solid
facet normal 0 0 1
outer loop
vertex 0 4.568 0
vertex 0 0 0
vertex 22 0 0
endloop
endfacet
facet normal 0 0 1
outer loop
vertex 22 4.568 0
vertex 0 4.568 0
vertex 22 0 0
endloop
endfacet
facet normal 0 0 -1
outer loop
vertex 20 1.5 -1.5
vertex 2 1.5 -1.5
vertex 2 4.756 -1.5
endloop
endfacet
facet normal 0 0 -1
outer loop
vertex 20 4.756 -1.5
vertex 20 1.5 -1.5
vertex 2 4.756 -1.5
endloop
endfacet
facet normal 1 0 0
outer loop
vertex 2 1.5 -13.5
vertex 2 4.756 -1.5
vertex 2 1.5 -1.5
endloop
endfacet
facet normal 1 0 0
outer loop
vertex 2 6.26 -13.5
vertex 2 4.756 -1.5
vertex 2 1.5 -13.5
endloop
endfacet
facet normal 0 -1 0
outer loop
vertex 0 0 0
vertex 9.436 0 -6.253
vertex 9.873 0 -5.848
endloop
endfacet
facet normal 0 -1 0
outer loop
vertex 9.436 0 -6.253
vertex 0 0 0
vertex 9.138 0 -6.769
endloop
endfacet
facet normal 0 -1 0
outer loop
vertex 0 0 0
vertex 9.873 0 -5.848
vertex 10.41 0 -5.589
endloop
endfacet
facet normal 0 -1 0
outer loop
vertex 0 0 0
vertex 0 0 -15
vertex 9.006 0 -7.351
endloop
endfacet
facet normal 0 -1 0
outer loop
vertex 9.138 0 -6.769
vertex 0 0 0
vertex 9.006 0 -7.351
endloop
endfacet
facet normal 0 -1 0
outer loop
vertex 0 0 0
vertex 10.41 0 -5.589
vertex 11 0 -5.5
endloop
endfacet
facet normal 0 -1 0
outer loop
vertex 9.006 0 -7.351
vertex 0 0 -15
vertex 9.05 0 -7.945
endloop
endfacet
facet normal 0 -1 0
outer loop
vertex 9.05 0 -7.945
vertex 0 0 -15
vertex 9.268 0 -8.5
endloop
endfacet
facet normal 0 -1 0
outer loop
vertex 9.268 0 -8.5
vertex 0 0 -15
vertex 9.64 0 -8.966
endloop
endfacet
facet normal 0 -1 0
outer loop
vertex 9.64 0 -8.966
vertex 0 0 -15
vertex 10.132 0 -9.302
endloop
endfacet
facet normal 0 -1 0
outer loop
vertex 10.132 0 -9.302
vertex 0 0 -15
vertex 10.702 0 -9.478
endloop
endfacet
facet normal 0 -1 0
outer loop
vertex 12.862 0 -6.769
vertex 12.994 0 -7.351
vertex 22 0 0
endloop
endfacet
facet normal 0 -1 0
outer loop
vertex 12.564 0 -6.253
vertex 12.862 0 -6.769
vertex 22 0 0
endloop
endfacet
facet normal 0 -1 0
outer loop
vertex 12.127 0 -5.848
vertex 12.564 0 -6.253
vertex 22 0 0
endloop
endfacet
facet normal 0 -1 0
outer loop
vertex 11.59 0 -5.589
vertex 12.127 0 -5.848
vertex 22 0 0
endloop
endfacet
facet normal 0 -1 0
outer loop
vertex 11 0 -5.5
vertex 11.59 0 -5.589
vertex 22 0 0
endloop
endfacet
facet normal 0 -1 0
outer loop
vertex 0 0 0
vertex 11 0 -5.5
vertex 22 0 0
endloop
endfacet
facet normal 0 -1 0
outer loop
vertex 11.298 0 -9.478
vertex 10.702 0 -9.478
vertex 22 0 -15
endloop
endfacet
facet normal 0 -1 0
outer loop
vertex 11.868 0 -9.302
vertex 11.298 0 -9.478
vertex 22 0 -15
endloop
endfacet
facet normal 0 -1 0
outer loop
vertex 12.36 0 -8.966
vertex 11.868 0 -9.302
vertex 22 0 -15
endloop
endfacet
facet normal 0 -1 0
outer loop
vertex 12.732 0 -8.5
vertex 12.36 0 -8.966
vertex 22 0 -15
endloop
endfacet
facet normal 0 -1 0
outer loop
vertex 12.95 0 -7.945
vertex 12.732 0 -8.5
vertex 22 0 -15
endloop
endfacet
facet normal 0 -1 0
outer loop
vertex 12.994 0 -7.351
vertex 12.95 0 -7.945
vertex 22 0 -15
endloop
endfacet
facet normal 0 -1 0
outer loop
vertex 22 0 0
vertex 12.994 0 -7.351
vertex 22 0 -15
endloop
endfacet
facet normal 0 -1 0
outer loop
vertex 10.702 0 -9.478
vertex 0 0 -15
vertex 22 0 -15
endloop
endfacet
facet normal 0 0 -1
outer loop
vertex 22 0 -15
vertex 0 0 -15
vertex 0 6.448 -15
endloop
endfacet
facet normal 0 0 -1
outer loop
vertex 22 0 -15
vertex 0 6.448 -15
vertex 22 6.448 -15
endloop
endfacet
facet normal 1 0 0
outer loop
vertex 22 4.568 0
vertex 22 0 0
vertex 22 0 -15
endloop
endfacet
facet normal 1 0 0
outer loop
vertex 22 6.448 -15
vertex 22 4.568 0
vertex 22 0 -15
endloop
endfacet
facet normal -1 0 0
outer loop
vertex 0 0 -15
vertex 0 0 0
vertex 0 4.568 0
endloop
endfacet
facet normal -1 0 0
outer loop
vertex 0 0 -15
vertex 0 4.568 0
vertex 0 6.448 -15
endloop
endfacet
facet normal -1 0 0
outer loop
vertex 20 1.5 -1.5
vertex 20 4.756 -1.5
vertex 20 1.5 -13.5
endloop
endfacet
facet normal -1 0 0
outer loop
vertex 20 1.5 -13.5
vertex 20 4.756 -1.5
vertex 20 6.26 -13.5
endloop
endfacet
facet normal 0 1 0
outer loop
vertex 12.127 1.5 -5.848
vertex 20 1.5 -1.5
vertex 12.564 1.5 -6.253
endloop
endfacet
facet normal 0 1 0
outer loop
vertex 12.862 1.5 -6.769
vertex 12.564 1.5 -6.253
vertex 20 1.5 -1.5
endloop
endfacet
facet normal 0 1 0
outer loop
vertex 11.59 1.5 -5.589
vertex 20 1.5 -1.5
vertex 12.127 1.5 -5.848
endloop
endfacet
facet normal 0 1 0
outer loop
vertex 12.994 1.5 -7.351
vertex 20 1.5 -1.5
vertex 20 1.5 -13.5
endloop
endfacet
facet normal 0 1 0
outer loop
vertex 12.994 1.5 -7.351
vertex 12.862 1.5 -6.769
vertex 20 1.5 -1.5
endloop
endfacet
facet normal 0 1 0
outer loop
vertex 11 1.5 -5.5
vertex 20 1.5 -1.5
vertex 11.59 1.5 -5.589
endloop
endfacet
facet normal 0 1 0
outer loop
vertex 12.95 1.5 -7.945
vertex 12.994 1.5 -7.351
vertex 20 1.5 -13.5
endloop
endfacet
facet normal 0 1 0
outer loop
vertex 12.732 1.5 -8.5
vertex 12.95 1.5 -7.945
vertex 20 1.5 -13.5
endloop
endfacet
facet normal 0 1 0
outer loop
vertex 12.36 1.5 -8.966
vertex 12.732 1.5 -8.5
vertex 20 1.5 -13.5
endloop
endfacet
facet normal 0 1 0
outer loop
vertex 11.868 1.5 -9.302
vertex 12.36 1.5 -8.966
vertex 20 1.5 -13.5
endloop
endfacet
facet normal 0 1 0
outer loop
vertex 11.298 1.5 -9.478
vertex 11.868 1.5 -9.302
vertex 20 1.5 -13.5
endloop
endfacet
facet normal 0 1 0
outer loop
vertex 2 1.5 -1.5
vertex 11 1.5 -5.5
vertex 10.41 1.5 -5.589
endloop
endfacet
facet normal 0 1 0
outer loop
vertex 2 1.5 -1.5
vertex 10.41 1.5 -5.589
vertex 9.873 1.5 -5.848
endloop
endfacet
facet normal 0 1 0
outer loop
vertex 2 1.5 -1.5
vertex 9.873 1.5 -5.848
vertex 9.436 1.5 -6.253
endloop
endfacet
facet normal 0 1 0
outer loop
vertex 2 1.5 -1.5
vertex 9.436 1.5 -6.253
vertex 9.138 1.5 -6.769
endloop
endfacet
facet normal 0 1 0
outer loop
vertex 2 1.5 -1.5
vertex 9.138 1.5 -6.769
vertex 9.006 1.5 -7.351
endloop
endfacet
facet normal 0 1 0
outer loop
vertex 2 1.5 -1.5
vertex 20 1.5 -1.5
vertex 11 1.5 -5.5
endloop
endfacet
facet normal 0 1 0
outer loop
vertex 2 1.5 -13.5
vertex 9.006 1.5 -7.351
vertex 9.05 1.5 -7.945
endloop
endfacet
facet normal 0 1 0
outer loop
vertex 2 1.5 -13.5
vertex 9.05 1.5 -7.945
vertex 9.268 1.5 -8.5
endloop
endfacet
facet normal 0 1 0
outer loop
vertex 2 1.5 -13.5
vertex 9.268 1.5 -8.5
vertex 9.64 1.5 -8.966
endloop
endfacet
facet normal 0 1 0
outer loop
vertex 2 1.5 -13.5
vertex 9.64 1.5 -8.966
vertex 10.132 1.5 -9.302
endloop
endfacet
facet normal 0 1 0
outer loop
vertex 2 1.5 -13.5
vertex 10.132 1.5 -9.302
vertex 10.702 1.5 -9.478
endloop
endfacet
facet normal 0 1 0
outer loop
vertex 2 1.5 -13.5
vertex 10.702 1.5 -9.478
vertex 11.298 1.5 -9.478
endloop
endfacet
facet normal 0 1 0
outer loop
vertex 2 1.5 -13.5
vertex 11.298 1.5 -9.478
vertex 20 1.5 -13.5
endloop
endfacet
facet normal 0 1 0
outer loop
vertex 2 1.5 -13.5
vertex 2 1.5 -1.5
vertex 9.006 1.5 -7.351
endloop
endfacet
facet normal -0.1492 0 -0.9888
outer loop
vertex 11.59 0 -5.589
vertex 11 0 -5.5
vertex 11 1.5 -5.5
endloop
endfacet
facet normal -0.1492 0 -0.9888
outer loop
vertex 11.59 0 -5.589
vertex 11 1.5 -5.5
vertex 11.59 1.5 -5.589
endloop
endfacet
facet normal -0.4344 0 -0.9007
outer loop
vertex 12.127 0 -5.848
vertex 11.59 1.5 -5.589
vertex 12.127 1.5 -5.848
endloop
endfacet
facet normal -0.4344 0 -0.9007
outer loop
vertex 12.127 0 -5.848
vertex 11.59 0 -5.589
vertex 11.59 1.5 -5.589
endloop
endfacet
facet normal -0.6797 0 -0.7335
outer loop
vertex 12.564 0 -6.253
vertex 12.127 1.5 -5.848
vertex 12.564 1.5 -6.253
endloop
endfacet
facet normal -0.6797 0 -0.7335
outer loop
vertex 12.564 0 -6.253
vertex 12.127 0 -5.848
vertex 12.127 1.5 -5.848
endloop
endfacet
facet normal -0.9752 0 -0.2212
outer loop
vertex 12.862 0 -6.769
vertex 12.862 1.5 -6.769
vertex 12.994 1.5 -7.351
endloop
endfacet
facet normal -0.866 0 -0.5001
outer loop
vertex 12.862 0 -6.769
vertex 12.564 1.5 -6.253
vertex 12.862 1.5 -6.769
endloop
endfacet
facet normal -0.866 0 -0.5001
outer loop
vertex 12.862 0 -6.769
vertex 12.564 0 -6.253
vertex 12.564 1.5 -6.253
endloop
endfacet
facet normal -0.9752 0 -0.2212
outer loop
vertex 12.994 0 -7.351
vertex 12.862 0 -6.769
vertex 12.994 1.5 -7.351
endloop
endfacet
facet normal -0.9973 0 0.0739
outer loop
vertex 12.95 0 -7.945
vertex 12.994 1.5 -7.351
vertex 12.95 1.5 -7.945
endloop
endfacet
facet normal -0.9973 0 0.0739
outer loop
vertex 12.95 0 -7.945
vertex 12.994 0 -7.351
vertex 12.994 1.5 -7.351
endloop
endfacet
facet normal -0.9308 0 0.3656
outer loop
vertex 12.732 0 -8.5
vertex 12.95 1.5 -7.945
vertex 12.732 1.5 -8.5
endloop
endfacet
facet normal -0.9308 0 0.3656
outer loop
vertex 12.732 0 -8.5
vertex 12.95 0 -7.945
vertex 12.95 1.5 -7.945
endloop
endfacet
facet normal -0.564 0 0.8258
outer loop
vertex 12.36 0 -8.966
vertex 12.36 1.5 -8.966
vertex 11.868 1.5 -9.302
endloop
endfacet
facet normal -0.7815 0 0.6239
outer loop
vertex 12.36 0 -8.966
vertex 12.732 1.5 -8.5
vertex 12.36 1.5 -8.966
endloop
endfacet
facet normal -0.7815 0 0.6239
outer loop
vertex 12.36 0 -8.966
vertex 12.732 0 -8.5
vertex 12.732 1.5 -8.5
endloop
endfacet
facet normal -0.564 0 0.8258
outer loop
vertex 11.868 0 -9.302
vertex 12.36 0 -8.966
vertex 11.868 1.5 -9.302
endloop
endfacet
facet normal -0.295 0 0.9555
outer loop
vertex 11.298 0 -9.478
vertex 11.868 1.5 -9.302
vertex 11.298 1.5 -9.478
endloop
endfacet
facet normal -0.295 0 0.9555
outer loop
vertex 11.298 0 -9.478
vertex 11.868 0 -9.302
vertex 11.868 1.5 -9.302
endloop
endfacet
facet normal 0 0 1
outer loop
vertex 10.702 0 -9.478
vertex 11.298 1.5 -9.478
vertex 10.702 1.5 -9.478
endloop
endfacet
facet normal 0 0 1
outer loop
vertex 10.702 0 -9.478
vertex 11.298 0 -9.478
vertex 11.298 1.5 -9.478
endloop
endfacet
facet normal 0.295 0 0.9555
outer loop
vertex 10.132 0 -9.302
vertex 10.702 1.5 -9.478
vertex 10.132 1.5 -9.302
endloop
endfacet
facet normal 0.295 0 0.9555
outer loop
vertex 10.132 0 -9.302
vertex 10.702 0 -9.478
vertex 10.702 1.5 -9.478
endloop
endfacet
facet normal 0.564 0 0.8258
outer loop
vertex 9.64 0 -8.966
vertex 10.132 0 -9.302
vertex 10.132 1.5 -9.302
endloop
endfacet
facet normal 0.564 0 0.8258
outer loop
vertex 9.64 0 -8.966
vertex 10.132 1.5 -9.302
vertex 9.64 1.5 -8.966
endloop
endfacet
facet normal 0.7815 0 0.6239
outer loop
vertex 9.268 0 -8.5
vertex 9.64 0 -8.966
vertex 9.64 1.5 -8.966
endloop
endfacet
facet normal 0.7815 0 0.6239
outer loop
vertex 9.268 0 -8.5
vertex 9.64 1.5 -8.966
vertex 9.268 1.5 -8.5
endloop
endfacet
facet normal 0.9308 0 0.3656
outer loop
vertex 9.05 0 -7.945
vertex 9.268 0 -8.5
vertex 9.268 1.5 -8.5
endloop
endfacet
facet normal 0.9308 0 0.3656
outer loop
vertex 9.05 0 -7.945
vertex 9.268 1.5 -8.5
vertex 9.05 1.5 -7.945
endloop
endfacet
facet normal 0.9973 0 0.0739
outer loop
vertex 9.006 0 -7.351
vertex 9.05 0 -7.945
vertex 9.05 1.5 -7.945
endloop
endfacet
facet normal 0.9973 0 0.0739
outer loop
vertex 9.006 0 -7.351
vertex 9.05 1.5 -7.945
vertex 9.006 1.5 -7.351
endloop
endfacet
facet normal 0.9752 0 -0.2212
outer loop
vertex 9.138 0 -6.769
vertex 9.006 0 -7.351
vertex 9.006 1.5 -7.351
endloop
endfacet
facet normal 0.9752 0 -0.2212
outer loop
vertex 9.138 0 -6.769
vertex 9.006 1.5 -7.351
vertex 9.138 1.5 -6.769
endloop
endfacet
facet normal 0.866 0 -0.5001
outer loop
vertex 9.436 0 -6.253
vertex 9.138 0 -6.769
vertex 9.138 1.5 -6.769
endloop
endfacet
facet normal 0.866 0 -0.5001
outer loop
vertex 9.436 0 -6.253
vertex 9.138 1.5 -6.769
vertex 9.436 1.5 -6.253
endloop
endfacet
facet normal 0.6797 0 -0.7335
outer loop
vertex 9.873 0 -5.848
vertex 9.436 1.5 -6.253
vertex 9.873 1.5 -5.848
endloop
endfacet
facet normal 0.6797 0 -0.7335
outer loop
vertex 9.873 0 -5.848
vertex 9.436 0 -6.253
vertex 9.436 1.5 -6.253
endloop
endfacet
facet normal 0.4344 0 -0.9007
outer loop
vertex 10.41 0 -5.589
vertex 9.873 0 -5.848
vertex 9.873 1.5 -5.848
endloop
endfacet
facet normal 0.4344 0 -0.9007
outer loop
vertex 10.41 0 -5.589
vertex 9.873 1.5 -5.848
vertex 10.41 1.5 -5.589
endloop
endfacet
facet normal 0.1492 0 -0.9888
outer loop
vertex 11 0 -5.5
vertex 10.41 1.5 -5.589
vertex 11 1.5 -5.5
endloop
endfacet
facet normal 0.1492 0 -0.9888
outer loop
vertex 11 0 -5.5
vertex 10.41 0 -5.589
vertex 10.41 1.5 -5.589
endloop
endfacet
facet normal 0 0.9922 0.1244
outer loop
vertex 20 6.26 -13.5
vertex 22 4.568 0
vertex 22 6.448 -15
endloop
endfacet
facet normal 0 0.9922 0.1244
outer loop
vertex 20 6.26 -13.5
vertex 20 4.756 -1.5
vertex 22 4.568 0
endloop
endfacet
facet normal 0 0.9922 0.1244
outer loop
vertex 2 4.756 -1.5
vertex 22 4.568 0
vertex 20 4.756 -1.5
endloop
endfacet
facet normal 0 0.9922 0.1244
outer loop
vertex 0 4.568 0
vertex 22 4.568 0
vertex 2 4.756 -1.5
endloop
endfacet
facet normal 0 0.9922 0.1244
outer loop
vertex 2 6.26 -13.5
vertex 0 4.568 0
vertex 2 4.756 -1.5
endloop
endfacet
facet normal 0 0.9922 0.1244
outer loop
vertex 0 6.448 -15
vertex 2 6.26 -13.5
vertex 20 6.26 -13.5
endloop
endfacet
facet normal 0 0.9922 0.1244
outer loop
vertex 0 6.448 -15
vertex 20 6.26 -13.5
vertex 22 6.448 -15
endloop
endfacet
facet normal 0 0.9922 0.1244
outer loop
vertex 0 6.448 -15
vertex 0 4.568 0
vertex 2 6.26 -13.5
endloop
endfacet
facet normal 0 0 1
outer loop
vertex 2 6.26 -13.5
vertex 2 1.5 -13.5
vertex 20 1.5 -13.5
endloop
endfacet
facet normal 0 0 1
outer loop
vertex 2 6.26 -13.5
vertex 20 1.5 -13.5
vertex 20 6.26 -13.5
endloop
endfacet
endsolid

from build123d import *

# Parameters (mm, degrees)
SKETCH2_W               = 22
SKETCH2_H               = 15
BOSS_EXTRUDE1_DEPTH     = 8
CUT_EXTRUDE2_DEPTH      = 27.248809497
CUT_EXTRUDE2_DEPTH_BACK = 27.248809497
SKETCH7_W               = 12
SKETCH7_H               = 5.260019913
CUT_EXTRUDE3_DEPTH      = 18
CUT_EXTRUDE4_DEPTH      = 28.082872227
CUT_EXTRUDE4_DEPTH_BACK = 28.082872227
SKETCH9_R               = 2


with BuildPart() as part:
    # Sketch2 → Boss-Extrude1 (new body)
    with BuildSketch(Plane(origin=(0, 0, 0), x_dir=(1, 0, 0), z_dir=(0, 1, 0))):
        with Locations((11, 7.5)):
            Rectangle(SKETCH2_W, SKETCH2_H)
    extrude(amount=BOSS_EXTRUDE1_DEPTH)

    # Sketch6 → Cut-Extrude2 (cut, two sides: drawn at the far end of the back side and taken through both)
    with BuildSketch(Plane(origin=(2, 0, 0), x_dir=(0, 0, -1), z_dir=(1, 0, 0)).offset(-CUT_EXTRUDE2_DEPTH_BACK)):
        Polygon((-0.545340916, 4.5), (15.415577352, 6.5), (15.415577352, 8.571331794), (-0.545340916, 8.571331794), align=None)
    extrude(amount=CUT_EXTRUDE2_DEPTH + CUT_EXTRUDE2_DEPTH_BACK, mode=Mode.SUBTRACT)

    # Sketch7 → Cut-Extrude3 (cut)
    with BuildSketch(Plane(origin=(2, 0, 0), x_dir=(0, 0, -1), z_dir=(1, 0, 0))):
        with Locations((7.5, 4.130009957)):
            Rectangle(SKETCH7_W, SKETCH7_H)
    extrude(amount=CUT_EXTRUDE3_DEPTH, mode=Mode.SUBTRACT)

    # Sketch9 → Cut-Extrude4 (cut, two sides: drawn at the far end of the back side and taken through both)
    with BuildSketch(Plane(origin=(0, 1.5, 0), x_dir=(1, 0, 0), z_dir=(0, 1, 0)).offset(-CUT_EXTRUDE4_DEPTH_BACK)):
        with Locations(Location((11, 7.5, 0), (0, 0, 270))):
            Circle(SKETCH9_R)
    extrude(amount=CUT_EXTRUDE4_DEPTH + CUT_EXTRUDE4_DEPTH_BACK, mode=Mode.SUBTRACT)


solid = part.part
